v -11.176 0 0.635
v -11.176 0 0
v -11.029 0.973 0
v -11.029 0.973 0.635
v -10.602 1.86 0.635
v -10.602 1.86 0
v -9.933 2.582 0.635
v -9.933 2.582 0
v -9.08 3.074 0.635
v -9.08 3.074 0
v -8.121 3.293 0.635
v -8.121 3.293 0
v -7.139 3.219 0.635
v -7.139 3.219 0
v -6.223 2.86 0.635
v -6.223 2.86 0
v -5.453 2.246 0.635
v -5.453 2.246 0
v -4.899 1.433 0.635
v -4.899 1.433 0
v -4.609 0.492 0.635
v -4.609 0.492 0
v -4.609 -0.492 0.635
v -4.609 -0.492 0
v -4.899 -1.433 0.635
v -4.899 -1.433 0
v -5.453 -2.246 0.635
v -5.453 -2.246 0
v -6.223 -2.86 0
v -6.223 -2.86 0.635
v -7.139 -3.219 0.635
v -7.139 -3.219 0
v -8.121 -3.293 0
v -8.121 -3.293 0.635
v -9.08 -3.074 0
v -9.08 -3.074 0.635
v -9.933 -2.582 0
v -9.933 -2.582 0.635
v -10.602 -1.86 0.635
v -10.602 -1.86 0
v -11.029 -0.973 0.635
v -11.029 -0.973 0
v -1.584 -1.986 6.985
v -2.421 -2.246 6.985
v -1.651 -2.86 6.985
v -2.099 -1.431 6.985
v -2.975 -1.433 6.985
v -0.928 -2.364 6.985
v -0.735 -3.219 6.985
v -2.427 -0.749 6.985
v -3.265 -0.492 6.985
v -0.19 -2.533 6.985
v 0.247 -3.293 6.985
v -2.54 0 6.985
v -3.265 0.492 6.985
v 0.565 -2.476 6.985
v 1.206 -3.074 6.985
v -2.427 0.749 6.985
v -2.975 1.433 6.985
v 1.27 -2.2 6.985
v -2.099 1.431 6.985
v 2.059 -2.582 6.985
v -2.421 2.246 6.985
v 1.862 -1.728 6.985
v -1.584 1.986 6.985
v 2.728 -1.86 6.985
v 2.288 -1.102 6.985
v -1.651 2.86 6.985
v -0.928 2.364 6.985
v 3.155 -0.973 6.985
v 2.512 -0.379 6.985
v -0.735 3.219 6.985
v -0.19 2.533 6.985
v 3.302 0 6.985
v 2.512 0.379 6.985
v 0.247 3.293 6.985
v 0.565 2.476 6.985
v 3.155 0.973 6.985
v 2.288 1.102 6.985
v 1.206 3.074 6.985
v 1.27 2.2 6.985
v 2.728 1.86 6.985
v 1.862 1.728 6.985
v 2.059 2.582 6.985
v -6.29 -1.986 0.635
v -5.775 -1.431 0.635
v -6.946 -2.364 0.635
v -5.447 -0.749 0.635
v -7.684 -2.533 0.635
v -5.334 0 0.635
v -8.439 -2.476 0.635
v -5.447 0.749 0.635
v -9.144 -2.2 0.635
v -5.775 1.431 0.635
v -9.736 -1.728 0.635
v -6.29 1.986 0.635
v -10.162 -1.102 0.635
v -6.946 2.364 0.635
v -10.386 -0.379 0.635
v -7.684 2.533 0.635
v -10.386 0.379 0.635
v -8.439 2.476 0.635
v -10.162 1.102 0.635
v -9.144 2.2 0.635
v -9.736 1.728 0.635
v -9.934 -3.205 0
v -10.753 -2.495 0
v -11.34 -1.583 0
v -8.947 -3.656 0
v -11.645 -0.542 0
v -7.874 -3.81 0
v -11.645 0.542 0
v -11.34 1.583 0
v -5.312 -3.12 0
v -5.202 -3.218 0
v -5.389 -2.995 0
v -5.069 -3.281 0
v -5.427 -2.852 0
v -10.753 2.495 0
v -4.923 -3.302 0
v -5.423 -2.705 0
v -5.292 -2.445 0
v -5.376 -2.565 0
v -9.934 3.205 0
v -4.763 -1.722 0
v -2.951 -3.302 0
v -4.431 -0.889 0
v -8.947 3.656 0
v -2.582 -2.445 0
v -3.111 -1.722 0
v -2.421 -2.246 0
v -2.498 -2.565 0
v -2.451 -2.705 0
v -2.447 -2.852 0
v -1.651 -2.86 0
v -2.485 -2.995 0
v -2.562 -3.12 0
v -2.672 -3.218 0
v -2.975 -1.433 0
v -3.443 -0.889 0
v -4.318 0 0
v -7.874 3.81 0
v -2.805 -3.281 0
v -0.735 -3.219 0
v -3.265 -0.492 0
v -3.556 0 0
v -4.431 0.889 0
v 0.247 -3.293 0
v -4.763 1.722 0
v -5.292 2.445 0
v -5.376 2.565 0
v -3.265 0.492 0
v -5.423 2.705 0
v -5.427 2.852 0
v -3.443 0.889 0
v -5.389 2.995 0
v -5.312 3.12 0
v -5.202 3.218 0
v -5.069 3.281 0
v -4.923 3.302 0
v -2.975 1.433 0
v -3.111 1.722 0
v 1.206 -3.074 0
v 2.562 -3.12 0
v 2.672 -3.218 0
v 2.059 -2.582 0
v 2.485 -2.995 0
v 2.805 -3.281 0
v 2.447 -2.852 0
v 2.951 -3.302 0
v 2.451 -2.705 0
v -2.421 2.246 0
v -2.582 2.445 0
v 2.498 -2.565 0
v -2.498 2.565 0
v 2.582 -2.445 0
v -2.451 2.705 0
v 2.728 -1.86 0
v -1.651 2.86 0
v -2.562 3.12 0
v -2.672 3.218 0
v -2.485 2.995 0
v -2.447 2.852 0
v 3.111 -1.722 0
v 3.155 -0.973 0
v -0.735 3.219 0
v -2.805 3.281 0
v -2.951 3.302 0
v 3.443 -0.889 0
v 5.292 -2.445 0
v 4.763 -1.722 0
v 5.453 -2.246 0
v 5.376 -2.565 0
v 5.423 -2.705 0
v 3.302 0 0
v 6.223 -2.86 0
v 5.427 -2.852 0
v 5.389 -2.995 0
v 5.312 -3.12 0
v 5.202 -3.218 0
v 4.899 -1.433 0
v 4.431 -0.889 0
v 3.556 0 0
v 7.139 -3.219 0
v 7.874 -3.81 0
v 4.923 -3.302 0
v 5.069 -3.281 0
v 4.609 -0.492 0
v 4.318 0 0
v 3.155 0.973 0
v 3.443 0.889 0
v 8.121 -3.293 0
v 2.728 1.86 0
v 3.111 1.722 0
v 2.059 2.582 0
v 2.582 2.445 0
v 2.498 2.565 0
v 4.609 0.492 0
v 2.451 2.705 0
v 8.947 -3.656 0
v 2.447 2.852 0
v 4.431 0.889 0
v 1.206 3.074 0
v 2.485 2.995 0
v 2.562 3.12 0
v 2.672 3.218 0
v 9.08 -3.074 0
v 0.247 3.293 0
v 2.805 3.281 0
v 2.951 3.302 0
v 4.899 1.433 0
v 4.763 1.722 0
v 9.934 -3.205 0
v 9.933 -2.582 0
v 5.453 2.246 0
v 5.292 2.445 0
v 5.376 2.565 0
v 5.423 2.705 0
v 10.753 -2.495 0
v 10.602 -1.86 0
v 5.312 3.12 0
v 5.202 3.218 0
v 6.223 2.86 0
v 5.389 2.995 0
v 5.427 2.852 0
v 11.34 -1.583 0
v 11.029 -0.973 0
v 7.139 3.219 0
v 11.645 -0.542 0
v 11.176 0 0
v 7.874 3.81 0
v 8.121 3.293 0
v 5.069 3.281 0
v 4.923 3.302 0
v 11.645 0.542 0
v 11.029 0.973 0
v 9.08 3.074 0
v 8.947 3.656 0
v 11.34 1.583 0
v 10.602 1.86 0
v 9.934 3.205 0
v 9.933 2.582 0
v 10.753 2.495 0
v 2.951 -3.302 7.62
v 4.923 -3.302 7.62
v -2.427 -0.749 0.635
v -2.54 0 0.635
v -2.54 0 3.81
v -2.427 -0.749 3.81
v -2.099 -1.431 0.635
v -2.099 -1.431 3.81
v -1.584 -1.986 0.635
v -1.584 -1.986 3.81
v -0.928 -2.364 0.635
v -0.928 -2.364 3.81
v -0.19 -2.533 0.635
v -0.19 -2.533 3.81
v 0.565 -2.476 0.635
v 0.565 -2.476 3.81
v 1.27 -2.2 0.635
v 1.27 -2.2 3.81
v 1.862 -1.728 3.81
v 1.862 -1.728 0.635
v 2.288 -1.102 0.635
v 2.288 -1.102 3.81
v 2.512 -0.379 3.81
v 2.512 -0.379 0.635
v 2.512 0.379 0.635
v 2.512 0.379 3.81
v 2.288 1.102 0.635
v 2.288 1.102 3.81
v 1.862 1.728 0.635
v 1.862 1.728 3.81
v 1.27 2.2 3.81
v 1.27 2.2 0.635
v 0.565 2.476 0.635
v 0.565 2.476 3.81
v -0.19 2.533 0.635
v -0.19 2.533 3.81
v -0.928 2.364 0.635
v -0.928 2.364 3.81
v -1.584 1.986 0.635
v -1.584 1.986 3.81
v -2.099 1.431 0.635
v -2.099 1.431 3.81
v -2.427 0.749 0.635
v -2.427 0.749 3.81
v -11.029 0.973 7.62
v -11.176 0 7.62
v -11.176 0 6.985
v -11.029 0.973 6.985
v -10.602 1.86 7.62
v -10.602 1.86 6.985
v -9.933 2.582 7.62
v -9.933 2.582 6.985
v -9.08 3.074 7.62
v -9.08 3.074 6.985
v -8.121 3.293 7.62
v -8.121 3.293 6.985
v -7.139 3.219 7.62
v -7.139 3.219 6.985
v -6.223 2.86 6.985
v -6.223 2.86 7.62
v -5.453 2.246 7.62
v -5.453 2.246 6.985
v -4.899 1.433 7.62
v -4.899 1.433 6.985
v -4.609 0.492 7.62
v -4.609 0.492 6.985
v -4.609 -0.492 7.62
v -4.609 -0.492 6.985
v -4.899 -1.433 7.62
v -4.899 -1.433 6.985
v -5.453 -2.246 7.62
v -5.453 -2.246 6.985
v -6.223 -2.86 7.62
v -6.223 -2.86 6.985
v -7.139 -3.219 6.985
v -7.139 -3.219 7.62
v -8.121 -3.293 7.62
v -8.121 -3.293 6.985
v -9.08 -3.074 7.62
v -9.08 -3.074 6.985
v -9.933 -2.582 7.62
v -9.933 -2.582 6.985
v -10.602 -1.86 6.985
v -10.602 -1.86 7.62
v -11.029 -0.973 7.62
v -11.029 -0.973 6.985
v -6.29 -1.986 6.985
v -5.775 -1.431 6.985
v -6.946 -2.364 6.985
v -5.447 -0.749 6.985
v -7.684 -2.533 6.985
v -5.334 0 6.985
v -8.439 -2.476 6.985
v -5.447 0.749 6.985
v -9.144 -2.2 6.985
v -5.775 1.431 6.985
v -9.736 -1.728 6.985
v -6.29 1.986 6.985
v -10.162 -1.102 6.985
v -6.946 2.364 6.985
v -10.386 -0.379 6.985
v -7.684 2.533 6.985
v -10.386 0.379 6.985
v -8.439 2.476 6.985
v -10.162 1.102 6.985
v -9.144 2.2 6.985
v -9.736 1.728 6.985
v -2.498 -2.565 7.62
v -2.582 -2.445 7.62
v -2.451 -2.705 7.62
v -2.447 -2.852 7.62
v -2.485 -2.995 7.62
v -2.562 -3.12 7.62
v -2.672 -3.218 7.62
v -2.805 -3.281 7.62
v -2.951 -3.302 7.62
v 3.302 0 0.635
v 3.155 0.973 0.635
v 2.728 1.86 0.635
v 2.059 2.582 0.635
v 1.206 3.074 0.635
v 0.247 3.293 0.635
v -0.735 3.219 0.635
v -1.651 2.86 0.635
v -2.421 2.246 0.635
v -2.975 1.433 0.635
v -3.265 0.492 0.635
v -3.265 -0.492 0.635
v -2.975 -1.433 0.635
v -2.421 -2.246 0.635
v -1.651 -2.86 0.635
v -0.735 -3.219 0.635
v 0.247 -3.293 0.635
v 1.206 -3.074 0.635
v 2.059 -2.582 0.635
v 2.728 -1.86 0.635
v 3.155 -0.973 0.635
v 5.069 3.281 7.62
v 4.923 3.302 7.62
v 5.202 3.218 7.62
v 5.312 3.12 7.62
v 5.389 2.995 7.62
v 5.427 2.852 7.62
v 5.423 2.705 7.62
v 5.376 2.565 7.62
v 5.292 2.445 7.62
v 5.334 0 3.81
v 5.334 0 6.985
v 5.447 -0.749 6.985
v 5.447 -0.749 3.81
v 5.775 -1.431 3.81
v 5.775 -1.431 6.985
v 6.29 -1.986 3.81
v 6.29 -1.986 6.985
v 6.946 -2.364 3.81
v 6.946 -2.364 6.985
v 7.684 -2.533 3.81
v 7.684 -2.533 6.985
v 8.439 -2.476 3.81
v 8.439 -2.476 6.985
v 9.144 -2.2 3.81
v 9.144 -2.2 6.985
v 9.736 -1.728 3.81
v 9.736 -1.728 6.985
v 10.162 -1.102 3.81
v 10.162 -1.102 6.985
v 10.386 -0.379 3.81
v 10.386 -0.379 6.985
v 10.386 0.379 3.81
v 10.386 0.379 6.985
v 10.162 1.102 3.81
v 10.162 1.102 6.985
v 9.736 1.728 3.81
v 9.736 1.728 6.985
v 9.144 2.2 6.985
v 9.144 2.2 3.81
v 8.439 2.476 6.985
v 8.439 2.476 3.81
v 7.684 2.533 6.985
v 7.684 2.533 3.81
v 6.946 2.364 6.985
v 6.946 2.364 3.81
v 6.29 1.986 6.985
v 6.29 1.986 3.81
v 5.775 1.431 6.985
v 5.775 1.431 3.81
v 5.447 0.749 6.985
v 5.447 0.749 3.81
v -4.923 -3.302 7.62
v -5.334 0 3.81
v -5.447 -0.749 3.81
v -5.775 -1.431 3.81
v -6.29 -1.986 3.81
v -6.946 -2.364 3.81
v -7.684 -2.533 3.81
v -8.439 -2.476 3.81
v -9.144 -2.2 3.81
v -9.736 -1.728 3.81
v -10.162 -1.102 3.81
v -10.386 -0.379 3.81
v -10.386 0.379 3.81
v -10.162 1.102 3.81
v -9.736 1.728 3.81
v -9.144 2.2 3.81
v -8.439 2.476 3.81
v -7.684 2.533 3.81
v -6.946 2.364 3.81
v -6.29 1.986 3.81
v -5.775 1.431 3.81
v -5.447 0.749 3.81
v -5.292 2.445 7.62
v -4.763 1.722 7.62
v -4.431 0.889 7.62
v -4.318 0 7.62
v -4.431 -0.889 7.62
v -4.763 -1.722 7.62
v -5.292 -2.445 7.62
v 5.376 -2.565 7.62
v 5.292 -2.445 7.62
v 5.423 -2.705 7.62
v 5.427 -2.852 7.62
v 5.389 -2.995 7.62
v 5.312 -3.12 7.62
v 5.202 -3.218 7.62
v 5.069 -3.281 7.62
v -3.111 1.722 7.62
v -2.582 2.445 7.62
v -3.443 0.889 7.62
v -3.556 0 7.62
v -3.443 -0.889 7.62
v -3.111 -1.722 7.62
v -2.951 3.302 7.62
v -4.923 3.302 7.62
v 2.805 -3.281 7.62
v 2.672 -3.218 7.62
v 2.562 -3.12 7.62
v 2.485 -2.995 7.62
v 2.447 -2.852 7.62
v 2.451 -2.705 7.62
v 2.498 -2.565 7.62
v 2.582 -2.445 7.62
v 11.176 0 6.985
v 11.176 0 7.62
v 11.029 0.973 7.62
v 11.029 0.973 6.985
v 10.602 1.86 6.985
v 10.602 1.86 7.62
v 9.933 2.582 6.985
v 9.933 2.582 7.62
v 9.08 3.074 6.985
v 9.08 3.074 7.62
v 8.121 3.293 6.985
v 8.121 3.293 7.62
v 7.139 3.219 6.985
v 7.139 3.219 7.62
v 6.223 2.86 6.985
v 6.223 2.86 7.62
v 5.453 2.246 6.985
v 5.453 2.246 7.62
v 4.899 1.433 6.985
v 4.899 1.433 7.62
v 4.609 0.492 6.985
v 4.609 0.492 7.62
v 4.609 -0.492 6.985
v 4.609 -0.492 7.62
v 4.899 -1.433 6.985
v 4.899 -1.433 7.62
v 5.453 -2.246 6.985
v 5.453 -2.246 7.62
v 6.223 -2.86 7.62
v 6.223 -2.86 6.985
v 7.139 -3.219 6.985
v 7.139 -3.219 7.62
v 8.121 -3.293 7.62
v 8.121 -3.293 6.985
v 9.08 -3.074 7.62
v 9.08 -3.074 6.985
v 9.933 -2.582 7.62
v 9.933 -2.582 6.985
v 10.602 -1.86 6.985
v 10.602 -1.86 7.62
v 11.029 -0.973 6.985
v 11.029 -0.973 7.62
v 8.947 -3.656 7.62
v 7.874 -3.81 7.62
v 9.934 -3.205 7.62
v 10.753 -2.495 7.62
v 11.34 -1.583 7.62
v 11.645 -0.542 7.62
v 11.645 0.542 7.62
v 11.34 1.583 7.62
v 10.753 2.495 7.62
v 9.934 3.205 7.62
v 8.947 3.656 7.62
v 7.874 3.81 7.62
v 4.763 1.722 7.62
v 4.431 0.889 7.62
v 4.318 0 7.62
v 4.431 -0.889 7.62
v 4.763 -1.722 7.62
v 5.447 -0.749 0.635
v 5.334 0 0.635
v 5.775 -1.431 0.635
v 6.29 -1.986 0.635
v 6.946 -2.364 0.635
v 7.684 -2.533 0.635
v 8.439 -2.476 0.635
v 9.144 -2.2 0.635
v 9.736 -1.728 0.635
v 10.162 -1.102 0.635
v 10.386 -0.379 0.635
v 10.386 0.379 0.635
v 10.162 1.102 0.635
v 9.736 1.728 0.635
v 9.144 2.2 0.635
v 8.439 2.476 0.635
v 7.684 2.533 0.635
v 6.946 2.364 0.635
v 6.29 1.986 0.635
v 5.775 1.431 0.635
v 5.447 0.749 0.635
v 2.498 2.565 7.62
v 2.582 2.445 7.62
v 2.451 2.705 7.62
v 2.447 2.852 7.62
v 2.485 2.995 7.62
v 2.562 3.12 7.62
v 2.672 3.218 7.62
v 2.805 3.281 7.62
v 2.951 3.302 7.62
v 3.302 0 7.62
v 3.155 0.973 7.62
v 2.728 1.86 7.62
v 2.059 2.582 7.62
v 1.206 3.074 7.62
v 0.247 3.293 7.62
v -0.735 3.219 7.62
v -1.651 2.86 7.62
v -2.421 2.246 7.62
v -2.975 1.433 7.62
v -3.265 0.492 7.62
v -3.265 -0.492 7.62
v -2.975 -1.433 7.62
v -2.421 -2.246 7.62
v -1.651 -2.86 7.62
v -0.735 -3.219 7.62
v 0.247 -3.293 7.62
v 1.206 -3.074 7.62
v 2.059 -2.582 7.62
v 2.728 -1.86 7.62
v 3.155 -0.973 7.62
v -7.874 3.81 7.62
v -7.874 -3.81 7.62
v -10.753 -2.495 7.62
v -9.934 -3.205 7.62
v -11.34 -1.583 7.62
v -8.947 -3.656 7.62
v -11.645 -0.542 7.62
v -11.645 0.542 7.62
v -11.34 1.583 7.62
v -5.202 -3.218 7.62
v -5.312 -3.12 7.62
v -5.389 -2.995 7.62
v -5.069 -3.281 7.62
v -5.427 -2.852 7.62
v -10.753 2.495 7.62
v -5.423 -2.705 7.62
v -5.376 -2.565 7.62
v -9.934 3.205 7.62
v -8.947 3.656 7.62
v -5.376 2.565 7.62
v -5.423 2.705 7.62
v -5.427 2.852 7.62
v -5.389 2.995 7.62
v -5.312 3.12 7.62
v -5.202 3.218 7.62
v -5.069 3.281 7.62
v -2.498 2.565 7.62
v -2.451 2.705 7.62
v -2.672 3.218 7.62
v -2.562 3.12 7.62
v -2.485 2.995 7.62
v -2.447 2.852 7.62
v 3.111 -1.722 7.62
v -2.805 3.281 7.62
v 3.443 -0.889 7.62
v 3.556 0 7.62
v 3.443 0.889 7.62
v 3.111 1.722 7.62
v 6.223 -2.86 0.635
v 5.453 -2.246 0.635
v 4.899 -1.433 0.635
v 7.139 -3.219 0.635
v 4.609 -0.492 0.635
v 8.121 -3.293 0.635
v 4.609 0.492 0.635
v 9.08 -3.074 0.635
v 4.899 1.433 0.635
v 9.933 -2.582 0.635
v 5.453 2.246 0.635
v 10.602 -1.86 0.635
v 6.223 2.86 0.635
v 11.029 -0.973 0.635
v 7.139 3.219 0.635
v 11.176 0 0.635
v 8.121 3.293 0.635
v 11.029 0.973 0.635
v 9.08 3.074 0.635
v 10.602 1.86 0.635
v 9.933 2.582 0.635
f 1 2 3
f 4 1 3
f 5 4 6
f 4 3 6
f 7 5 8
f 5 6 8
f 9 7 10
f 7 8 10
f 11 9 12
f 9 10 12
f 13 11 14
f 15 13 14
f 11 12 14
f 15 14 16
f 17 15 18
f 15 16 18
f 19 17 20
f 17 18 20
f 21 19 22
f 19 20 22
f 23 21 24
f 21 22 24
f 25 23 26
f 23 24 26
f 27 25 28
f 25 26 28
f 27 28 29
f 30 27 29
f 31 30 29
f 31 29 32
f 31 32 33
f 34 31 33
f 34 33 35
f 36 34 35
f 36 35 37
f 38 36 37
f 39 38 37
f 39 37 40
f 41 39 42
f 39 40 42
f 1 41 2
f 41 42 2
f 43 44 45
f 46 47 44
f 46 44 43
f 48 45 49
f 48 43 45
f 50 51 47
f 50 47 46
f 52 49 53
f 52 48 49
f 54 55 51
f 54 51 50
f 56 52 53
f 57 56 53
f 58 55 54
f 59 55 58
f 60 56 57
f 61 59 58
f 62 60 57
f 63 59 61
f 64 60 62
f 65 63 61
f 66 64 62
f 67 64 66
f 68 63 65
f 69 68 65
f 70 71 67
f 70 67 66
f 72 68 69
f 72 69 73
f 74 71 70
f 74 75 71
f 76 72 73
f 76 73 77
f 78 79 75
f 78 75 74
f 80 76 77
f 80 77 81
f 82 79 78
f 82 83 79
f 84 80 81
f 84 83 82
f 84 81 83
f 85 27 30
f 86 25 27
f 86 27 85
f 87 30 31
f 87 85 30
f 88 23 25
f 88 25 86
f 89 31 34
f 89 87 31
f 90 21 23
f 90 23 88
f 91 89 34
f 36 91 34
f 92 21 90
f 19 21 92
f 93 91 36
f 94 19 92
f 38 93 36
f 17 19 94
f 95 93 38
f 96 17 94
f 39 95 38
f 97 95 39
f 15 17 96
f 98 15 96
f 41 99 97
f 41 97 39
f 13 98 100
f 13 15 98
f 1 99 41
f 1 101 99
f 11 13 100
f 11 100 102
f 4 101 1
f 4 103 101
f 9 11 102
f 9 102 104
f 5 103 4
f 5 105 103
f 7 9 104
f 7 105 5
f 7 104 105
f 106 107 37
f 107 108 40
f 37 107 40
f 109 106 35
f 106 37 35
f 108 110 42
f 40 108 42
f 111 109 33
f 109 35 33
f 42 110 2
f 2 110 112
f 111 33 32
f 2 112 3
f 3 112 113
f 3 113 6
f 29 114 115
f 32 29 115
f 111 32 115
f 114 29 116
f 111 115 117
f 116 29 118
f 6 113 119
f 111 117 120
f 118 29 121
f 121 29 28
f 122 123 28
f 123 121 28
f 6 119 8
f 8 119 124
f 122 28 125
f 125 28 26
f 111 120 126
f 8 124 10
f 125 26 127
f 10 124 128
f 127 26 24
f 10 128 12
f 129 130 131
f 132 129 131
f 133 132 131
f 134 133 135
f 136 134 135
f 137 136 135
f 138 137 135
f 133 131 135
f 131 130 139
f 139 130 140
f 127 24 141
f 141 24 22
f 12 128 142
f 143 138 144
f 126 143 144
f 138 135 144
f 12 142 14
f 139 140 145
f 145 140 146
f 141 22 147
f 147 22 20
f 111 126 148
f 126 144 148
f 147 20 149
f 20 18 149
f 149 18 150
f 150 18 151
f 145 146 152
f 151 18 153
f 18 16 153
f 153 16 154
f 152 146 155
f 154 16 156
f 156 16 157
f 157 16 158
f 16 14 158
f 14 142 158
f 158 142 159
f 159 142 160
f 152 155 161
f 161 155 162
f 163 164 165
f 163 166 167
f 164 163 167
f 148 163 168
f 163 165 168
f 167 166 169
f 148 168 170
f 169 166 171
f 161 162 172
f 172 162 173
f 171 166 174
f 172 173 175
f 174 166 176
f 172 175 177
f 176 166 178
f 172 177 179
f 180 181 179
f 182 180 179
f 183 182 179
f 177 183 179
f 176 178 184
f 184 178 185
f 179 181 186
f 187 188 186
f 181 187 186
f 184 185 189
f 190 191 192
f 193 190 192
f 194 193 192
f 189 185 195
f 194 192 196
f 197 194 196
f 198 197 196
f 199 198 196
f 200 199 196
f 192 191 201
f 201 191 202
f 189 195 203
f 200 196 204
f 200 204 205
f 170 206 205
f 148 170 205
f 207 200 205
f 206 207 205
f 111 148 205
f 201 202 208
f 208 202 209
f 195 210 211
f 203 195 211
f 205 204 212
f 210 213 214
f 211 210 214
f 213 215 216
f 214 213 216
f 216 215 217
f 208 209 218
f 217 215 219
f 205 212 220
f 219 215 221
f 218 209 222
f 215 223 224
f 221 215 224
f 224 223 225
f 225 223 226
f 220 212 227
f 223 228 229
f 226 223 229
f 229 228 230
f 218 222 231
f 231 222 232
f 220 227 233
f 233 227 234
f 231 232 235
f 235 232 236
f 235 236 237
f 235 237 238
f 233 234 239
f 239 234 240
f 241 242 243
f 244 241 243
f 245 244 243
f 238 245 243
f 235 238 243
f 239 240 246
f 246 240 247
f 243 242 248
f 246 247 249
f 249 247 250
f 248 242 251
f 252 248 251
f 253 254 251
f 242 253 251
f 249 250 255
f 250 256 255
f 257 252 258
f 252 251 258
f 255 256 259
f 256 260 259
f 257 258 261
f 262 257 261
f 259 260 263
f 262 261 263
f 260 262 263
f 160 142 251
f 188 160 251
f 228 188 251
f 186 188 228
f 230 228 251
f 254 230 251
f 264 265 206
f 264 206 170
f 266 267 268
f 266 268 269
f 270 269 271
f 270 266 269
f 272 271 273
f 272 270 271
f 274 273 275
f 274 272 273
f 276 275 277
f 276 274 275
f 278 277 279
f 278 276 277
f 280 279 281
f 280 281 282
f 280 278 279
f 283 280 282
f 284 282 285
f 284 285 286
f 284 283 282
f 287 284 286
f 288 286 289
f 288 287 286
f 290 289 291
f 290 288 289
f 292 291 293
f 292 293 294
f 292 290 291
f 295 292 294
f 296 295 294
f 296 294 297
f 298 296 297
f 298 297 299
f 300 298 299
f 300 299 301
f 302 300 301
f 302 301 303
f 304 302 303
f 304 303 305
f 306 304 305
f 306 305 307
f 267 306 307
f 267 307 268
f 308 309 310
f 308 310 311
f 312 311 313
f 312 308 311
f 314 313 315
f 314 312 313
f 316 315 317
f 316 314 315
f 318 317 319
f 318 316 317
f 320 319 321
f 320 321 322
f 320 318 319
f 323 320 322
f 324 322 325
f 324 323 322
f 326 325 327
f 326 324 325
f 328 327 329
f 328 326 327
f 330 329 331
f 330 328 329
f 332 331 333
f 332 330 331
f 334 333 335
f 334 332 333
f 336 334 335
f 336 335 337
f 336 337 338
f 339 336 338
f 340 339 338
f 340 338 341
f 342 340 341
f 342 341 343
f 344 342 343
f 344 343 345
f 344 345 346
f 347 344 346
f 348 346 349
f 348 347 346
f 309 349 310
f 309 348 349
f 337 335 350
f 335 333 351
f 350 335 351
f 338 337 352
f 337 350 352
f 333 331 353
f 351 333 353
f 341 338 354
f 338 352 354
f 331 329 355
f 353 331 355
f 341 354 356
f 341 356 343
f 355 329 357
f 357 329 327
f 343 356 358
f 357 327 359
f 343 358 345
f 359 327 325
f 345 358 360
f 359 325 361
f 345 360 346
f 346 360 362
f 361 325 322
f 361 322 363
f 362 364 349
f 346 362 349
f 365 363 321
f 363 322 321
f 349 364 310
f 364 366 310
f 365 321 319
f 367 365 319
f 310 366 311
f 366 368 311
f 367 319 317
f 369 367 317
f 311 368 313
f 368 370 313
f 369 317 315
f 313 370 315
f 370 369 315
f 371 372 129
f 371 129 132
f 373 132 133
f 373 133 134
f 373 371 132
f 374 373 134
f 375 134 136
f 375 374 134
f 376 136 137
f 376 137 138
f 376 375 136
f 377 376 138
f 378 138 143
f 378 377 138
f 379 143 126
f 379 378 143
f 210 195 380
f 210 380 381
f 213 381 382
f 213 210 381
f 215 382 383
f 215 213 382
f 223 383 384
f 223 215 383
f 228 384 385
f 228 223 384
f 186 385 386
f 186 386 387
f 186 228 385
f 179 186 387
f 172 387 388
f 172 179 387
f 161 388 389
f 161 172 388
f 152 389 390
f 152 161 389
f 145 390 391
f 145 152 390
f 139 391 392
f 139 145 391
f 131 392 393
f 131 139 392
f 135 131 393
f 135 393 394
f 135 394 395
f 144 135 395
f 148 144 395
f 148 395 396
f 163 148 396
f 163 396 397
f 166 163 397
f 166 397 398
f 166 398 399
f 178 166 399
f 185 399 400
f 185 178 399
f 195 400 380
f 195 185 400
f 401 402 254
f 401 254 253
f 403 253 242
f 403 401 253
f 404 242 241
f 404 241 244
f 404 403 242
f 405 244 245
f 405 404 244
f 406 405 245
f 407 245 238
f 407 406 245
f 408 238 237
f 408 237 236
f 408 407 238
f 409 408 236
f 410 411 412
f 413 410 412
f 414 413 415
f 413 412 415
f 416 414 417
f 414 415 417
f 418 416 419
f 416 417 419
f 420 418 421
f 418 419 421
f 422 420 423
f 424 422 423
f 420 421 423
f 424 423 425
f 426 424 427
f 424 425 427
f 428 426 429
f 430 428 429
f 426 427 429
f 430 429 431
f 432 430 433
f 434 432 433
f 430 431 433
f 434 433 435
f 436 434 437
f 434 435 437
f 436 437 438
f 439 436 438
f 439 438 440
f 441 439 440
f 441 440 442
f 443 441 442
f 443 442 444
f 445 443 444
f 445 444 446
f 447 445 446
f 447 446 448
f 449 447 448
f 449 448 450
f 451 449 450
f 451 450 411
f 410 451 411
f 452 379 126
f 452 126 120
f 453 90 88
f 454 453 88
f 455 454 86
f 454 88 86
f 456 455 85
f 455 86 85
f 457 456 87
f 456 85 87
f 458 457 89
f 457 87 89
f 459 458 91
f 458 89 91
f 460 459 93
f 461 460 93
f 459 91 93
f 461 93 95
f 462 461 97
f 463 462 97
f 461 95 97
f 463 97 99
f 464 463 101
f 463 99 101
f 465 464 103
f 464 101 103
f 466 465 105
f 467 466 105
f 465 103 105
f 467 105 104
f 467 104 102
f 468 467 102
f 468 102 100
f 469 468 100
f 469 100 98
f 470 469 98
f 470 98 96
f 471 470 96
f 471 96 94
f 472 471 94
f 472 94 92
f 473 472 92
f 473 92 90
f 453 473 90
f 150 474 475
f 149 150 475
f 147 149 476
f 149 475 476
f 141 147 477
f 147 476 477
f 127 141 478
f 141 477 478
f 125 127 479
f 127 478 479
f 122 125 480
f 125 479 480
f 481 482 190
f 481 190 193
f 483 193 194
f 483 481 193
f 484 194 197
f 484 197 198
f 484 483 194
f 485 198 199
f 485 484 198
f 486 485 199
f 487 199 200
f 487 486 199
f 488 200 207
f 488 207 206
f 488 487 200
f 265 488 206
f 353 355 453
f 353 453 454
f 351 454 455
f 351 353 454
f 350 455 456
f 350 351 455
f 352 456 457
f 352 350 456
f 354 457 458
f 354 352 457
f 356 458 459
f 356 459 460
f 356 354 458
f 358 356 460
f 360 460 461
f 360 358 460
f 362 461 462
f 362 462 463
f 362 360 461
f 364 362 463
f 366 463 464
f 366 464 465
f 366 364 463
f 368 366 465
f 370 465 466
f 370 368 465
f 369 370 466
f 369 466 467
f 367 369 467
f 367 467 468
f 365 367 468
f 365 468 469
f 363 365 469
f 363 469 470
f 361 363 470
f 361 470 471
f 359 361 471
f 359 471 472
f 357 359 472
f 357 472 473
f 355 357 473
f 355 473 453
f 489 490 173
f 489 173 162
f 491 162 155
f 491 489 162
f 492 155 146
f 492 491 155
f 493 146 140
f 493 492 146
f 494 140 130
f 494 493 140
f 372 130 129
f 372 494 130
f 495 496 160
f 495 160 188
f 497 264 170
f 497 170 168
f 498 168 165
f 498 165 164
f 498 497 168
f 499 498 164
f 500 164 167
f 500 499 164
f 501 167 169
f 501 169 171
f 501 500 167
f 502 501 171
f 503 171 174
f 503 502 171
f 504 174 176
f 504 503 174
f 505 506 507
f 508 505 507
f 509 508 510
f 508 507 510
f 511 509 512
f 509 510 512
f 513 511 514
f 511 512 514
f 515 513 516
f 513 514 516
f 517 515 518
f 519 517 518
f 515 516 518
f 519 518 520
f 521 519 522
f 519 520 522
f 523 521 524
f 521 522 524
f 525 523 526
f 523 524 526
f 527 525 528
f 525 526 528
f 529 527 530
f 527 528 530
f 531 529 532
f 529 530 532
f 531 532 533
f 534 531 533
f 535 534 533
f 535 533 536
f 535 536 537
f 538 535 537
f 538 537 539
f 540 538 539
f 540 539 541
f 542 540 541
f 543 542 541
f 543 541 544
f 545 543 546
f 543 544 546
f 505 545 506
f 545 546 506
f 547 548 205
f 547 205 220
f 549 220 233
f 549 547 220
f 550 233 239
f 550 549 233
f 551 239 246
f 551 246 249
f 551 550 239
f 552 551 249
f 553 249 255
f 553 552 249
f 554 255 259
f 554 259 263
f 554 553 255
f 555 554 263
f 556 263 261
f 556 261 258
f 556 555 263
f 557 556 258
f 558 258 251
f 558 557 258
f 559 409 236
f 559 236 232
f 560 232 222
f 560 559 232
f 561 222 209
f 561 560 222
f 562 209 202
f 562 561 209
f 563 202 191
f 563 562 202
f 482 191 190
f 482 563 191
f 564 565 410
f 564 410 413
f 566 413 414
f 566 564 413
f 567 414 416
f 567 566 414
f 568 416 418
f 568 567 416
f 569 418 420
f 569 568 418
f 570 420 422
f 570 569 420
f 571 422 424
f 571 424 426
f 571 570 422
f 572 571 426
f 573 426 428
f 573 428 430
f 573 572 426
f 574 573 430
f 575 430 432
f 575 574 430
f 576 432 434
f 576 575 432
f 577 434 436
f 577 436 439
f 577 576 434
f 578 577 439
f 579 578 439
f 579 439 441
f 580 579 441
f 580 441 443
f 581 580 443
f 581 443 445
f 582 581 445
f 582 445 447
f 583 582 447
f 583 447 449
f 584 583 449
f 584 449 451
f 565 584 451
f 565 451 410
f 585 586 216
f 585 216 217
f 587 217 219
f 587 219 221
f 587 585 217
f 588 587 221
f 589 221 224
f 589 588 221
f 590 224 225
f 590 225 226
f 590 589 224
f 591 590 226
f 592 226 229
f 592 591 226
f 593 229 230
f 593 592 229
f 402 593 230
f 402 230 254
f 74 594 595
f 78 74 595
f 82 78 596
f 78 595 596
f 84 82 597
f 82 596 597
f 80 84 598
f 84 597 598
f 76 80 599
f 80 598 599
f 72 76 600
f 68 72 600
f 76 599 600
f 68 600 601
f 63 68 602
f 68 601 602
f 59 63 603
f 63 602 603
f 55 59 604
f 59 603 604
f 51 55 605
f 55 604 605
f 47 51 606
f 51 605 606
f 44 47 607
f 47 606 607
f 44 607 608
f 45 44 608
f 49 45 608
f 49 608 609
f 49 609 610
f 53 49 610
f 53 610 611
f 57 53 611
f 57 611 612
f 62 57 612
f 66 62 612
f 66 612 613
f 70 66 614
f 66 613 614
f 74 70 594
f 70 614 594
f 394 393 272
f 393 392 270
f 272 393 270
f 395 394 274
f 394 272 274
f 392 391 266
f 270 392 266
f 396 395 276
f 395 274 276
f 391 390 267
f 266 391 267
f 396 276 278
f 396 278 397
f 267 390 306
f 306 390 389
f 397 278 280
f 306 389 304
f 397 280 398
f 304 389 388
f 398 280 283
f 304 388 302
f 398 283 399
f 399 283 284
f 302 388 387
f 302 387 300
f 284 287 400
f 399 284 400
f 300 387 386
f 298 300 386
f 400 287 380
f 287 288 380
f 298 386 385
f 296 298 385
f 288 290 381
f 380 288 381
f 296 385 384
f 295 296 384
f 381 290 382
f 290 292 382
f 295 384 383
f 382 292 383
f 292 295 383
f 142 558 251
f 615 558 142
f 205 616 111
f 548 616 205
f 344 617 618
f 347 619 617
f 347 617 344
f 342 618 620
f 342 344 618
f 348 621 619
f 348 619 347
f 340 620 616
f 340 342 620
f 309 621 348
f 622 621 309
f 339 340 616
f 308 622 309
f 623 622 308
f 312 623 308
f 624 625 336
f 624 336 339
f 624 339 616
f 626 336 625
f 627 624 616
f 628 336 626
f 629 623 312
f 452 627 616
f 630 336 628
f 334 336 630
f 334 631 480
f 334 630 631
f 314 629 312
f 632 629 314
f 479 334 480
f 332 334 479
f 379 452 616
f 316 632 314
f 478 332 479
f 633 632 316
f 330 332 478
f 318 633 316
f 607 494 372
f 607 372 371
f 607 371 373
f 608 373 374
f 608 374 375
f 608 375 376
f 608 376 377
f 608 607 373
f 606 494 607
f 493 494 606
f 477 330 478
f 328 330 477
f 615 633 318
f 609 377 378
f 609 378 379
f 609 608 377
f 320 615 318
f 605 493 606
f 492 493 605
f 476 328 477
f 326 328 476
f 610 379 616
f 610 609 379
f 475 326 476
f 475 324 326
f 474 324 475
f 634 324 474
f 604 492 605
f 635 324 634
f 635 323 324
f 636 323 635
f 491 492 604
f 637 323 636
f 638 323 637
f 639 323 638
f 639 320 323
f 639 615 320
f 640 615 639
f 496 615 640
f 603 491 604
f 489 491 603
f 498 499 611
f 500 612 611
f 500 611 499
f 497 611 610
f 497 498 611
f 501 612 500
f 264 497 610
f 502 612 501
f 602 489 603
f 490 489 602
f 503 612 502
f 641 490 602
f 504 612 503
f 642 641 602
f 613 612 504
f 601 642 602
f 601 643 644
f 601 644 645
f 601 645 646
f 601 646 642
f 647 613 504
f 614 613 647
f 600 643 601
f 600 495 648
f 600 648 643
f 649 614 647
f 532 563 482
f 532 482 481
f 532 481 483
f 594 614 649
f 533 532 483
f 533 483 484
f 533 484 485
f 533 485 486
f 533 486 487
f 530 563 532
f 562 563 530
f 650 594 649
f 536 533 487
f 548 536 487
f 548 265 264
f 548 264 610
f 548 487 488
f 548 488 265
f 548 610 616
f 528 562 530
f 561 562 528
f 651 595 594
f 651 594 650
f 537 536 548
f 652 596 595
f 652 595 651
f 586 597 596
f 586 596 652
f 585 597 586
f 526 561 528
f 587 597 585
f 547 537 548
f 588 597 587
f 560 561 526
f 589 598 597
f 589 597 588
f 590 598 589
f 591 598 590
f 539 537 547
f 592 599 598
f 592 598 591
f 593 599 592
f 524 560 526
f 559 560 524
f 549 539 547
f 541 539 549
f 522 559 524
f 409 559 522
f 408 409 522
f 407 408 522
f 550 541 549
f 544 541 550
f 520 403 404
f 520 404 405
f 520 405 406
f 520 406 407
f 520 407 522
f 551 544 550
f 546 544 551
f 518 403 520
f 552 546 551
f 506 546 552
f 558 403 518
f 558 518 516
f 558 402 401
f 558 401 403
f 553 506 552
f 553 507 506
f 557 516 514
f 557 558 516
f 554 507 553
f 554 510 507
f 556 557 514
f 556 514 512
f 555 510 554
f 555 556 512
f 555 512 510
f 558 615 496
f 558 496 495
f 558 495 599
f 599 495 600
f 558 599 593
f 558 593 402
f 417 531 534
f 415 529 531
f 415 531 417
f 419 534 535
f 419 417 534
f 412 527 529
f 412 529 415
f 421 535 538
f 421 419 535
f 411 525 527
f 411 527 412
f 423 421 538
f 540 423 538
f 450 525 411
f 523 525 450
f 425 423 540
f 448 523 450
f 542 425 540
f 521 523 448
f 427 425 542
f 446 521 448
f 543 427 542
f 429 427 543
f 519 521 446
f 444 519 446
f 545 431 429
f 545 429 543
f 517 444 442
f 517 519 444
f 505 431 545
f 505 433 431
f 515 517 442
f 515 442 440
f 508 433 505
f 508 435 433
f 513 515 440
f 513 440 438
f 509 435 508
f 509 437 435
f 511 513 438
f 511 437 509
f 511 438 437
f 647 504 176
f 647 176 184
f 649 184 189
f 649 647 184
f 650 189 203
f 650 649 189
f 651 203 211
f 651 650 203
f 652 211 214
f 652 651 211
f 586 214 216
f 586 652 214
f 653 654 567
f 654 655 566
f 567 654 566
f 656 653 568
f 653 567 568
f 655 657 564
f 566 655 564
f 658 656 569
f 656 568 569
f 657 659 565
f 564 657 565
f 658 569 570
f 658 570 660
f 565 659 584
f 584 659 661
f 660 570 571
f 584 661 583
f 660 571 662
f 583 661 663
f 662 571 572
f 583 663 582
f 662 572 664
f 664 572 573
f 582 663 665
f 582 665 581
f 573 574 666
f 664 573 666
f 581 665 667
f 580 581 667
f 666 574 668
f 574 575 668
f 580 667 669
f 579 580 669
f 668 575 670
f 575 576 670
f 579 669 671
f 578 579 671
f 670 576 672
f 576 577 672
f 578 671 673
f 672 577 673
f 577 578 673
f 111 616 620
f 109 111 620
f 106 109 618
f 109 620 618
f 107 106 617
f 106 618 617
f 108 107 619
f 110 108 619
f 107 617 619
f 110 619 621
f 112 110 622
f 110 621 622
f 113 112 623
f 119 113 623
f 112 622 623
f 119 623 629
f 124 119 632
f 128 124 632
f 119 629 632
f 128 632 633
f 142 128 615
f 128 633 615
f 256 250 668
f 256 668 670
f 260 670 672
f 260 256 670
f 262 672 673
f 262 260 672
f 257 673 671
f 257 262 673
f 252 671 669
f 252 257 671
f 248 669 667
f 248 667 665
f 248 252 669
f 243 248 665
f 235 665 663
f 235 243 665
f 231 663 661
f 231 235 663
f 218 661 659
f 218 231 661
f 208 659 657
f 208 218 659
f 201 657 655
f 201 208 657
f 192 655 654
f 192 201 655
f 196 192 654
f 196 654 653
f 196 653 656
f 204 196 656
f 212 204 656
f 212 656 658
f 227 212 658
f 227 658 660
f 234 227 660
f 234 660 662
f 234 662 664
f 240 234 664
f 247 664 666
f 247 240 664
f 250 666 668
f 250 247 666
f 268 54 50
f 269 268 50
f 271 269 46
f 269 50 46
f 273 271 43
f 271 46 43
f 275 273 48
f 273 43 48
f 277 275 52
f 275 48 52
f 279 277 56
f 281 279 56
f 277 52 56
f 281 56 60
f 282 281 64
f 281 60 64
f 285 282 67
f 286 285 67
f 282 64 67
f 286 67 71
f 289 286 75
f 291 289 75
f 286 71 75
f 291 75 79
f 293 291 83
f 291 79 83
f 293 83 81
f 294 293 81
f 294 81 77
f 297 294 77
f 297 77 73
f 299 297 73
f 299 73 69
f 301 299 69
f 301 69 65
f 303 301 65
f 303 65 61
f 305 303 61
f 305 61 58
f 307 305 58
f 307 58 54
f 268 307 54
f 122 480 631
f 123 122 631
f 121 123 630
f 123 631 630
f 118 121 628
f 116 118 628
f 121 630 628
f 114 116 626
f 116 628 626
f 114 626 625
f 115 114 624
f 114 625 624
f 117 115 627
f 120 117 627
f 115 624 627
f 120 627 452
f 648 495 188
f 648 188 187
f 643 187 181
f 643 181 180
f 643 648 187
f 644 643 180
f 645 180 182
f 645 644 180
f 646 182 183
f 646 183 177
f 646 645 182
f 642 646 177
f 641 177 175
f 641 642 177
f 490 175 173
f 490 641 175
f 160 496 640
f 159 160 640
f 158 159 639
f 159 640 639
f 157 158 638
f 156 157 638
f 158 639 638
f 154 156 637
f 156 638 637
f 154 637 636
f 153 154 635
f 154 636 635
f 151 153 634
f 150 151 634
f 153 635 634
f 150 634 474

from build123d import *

# Parameters (mm, degrees)
SKETCH1_R           = 2.54
BOSS_EXTRUDE1_DEPTH = 3.81
SKETCH1_7_R         = 2.54
BOSS_EXTRUDE2_DEPTH = 3.81
SKETCH2_R           = 3.302
CUT_EXTRUDE1_DEPTH  = 0.635


with BuildPart() as part:
    # Sketch1 → Boss-Extrude1 (new body)
    with BuildSketch(Plane.XY):
        with BuildLine():
            Line((3.937, -3.81), (7.874, -3.81))
            ThreePointArc((7.874, -3.81), (11.684, 0), (7.874, 3.81))
            Line((7.874, 3.81), (3.937, 3.81))
            Line((3.937, 3.81), (3.937, 3.302))
            Line((3.937, 3.302), (4.92278669, 3.302))
            ThreePointArc((4.92278669, 3.302), (5.389414486, 2.994804631), (5.291688354, 2.44475))
            ThreePointArc((5.291688354, 2.44475), (4.318, 0), (5.291688354, -2.44475))
            ThreePointArc((5.291688354, -2.44475), (5.389414486, -2.994804631), (4.92278669, -3.302))
            Line((4.92278669, -3.302), (3.937, -3.302))
            Line((3.937, -3.302), (3.937, -3.81))
        make_face()
        with Locations((7.874, 0)):
            Circle(SKETCH1_R, mode=Mode.SUBTRACT)
    extrude(amount=BOSS_EXTRUDE1_DEPTH)


with BuildPart() as body_2:
    # Sketch1<7> → Boss-Extrude2 (new body)
    with BuildSketch(Plane.XY):
        with BuildLine():
            Line((3.937, -3.81), (3.937, -3.302))
            Line((3.937, -3.302), (2.95121331, -3.302))
            ThreePointArc((2.95121331, -3.302), (2.484585514, -2.994804631), (2.582311646, -2.44475))
            ThreePointArc((2.582311646, -2.44475), (3.556, 0), (2.582311646, 2.44475))
            ThreePointArc((2.582311646, 2.44475), (2.484585514, 2.994804631), (2.95121331, 3.302))
            Line((2.95121331, 3.302), (3.937, 3.302))
            Line((3.937, 3.302), (3.937, 3.81))
            Line((3.937, 3.81), (-3.937, 3.81))
            Line((-3.937, 3.81), (-3.937, 3.302))
            Line((-3.937, 3.302), (-2.95121331, 3.302))
            ThreePointArc((-2.95121331, 3.302), (-2.484585514, 2.994804631), (-2.582311646, 2.44475))
            ThreePointArc((-2.582311646, 2.44475), (-3.556, 0), (-2.582311646, -2.44475))
            ThreePointArc((-2.582311646, -2.44475), (-2.484585514, -2.994804631), (-2.95121331, -3.302))
            Line((-2.95121331, -3.302), (-3.937, -3.302))
            Line((-3.937, -3.302), (-3.937, -3.81))
            Line((-3.937, -3.81), (3.937, -3.81))
        make_face()
        Circle(SKETCH1_7_R, mode=Mode.SUBTRACT)
    extrude(amount=BOSS_EXTRUDE2_DEPTH)


with BuildPart() as cut_extrude1_tool:
    # Sketch2 → Cut-Extrude1 (new body)
    with BuildSketch(Plane.XY):
        with Locations((7.874, 0)):
            Circle(SKETCH2_R)
        Circle(SKETCH2_R)
    extrude(amount=CUT_EXTRUDE1_DEPTH)


with BuildPart() as part_1:
    add(part.part)

    # Cut-Extrude1: cut by cut_extrude1_tool
    add(cut_extrude1_tool.part, mode=Mode.SUBTRACT)


with BuildPart() as body_2_1:
    add(body_2.part)

    # Cut-Extrude1: cut by cut_extrude1_tool
    add(cut_extrude1_tool.part, mode=Mode.SUBTRACT)


with BuildPart() as body_3:
    # Mirror2: mirrored copy
    add(part_1.part.mirror(Plane(origin=(0, 0, 0), x_dir=(0, 0, 1), z_dir=(1, 0, 0))))


with BuildPart() as part_2:
    add(part_1.part)

    # Combine1: union body 3, body 2
    add(body_3.part)
    add(body_2_1.part)

    # Mirror3: part across plane


with BuildPart() as part_3:
    add(part_2.part)
    add(part_2.part.mirror(Plane.XY.offset(3.81)))


solid = part_3.part
